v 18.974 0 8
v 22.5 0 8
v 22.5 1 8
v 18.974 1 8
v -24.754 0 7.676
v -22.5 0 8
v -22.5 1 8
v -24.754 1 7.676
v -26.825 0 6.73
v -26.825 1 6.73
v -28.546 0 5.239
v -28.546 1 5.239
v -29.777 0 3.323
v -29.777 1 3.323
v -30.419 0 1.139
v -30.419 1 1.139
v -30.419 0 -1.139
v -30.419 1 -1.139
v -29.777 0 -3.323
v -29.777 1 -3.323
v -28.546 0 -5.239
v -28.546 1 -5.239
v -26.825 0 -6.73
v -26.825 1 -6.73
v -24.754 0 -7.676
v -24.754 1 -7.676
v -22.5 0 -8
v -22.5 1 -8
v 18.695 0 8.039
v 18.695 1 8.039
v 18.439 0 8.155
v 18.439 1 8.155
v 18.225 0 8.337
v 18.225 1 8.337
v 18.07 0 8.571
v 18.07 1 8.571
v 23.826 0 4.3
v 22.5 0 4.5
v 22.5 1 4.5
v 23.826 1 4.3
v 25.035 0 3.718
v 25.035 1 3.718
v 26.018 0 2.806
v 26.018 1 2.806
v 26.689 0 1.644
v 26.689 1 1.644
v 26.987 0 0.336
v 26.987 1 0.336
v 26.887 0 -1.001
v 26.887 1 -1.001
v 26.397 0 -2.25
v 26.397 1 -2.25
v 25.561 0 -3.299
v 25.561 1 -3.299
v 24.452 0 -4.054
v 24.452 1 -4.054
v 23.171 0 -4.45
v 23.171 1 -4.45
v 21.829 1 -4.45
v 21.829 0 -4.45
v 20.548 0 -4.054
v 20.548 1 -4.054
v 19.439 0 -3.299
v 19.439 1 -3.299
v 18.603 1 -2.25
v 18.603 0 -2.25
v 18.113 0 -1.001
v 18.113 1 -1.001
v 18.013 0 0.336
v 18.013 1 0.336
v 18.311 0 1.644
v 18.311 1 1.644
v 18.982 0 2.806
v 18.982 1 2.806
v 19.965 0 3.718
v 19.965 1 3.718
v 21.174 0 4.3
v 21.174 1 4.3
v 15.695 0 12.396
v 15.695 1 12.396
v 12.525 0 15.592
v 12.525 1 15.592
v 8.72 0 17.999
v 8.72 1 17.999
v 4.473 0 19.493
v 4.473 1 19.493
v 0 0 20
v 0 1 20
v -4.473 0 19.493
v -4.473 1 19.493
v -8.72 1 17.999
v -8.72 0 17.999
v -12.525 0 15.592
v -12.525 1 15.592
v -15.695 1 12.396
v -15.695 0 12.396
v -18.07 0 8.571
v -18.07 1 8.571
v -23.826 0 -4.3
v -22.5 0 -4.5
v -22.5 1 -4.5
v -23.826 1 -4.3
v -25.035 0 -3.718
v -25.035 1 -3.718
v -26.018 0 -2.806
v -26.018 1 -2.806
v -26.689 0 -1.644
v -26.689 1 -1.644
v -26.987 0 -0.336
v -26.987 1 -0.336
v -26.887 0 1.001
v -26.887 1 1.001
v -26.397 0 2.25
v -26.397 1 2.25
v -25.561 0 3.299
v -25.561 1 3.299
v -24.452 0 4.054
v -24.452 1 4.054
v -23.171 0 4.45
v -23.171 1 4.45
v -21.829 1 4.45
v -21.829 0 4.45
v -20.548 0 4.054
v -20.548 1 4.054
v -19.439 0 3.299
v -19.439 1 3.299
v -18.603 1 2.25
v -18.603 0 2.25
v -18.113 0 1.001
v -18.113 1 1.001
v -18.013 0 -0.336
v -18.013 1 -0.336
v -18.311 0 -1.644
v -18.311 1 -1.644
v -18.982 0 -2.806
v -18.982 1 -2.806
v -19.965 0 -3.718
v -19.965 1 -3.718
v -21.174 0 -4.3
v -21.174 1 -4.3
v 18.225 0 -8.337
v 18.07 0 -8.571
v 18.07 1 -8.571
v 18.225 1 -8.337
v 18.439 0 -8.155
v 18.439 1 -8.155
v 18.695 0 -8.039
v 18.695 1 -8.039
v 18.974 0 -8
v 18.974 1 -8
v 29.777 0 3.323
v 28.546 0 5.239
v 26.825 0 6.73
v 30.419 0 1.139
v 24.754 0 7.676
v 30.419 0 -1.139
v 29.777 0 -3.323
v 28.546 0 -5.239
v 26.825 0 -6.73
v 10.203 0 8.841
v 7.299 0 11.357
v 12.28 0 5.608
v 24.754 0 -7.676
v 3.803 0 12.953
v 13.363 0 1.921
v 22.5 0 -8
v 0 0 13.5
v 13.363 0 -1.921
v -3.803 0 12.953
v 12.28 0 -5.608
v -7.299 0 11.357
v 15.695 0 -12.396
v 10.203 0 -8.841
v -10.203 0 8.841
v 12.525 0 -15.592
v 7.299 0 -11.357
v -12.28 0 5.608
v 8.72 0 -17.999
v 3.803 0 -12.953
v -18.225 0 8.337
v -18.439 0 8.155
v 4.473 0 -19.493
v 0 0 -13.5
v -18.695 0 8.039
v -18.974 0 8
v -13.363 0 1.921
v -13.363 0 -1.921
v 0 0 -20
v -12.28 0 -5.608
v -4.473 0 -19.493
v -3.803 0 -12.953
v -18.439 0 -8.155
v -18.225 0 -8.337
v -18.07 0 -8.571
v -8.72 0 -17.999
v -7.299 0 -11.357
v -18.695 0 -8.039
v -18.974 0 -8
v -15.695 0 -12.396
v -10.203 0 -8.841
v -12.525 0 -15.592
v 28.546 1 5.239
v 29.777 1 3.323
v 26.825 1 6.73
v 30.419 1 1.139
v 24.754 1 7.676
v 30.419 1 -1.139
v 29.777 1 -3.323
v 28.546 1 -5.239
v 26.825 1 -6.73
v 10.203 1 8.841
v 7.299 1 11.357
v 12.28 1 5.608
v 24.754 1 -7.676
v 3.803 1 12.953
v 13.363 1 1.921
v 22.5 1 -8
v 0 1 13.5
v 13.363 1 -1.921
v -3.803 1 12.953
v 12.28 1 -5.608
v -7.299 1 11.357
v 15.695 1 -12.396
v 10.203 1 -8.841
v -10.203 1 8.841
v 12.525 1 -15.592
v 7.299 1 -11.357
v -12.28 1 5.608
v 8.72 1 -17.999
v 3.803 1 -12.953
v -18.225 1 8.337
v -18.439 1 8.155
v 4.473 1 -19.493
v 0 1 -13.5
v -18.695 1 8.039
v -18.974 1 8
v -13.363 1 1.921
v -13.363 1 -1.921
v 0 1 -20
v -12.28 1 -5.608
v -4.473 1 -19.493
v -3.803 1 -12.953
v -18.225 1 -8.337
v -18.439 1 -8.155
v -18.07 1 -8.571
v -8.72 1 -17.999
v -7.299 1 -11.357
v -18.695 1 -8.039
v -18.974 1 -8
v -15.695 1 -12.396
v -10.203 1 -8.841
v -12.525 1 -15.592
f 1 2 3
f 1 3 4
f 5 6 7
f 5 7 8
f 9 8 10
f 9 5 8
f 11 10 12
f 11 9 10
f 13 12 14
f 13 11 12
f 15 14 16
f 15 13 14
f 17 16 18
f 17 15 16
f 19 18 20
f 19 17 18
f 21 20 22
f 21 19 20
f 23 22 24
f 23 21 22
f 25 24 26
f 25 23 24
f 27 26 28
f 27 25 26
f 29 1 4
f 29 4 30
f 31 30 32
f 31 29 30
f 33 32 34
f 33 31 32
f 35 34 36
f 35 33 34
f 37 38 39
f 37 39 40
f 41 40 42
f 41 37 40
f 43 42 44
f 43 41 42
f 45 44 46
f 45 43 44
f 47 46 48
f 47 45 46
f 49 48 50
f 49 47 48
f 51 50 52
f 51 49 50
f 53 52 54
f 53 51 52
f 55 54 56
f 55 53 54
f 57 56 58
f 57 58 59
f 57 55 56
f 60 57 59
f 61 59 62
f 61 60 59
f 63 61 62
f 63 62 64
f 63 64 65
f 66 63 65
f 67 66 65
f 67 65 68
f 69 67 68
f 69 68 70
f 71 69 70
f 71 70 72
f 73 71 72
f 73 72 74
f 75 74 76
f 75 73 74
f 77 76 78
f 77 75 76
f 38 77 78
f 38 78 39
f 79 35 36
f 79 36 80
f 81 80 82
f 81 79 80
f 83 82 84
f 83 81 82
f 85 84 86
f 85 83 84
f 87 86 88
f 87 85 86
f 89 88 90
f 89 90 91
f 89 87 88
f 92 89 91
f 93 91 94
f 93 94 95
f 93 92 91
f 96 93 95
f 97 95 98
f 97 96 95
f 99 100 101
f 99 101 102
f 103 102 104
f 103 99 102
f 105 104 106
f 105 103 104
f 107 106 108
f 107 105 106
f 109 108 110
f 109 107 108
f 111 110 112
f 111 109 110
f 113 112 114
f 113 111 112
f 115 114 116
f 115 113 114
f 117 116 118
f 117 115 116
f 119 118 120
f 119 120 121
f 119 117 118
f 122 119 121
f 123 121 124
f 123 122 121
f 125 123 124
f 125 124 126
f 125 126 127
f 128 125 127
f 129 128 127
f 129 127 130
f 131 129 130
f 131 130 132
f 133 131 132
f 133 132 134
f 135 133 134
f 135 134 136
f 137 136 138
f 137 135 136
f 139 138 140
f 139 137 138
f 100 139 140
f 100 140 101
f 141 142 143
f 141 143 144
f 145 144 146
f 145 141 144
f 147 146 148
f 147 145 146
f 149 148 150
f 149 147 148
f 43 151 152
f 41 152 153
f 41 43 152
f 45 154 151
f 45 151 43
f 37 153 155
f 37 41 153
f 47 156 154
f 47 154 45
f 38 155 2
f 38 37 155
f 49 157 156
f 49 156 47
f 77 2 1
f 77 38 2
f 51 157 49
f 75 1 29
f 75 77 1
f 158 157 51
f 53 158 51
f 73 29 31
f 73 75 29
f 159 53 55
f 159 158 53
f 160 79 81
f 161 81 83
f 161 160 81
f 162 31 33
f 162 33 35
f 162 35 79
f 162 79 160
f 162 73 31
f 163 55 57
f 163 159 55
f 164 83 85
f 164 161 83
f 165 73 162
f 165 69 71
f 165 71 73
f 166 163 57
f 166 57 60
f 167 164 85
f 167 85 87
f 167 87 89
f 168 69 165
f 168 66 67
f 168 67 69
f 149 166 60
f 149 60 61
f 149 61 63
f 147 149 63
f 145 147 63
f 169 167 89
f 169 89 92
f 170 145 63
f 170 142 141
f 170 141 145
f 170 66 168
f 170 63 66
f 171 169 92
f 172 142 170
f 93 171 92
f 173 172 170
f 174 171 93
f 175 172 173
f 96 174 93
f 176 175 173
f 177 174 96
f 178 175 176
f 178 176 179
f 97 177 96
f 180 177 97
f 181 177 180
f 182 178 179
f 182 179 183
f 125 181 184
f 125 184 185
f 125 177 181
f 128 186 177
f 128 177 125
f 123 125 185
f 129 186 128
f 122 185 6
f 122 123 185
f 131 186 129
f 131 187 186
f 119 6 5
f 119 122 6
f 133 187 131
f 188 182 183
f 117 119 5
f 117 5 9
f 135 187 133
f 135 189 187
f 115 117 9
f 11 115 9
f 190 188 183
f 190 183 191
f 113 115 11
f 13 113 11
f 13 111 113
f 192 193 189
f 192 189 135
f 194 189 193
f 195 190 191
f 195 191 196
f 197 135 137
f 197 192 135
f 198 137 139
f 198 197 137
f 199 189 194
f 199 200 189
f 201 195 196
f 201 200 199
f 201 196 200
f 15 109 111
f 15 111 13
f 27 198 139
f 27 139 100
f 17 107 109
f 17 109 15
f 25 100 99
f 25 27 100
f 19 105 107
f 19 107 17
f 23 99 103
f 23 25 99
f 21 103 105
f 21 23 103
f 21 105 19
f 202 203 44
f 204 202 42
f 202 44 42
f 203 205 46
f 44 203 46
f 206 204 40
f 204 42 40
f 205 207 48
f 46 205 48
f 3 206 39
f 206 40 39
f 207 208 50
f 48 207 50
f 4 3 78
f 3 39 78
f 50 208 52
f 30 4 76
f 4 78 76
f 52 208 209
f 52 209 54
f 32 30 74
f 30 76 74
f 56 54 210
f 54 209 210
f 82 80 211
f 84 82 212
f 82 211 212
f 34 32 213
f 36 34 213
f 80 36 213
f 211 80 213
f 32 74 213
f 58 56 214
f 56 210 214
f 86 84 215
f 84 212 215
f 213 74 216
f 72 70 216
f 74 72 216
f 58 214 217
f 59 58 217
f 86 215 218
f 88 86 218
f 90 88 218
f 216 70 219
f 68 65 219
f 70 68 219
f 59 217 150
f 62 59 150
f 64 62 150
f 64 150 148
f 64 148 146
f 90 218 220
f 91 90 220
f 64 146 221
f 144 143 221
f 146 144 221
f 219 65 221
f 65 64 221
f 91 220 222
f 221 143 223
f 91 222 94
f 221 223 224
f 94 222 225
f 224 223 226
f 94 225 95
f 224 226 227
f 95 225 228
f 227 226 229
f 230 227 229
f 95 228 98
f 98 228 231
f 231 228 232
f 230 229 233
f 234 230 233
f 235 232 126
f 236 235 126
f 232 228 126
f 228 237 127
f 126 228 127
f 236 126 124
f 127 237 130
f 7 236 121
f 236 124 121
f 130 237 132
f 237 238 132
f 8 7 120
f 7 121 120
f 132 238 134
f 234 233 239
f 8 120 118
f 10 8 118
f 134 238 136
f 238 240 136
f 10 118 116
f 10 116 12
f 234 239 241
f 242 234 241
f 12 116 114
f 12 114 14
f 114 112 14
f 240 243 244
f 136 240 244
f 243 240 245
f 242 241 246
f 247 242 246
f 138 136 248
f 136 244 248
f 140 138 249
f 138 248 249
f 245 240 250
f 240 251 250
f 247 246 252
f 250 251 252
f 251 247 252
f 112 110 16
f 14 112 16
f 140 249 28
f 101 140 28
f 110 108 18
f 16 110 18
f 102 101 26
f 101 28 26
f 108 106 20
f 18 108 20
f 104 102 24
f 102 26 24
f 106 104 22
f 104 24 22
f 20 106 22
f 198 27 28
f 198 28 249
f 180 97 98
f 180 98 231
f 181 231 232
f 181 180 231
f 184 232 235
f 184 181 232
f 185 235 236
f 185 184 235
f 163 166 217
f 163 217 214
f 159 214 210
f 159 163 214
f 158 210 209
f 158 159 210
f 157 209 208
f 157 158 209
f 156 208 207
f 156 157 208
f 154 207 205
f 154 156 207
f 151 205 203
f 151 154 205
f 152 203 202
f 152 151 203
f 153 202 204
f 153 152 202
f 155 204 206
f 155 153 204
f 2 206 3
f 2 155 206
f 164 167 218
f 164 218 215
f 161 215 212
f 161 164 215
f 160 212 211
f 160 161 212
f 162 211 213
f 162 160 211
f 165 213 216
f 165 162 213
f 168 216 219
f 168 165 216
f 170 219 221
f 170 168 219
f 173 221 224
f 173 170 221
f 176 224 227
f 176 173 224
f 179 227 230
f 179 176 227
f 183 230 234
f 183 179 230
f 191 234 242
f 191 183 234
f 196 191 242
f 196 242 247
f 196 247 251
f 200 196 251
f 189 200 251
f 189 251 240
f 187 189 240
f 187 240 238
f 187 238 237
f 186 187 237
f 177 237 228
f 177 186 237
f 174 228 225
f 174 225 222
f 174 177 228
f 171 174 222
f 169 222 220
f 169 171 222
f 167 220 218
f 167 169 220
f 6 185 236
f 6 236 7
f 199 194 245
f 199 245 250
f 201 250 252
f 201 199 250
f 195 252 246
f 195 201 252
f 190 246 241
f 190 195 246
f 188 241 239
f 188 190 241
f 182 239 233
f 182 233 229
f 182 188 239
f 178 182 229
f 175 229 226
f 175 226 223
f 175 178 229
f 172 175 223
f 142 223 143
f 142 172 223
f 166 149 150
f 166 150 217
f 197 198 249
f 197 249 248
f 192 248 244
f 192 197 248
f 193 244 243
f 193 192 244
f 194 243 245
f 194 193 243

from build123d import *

# Parameters (mm, degrees)
SKETCH_1_R      = 13.5
SKETCH_1_R_2    = 4.5
EXTRUDE_1_DEPTH = 1


with BuildPart() as part:
    # 草圖1 → 伸長1 (new body)
    with BuildSketch(Plane(origin=(0, 0, 0), x_dir=(1, 0, 0), z_dir=(0, 1, 0))):
        with BuildLine():
            Line((18.973665961, 8), (22.5, 8))
            ThreePointArc((22.5, 8), (30.5, 0), (22.5, -8))
            Line((22.5, -8), (18.973665961, -8))
            ThreePointArc((18.973665961, -8), (18.439143477, -8.154845745), (18.070158058, -8.571428571))
            ThreePointArc((18.070158058, -8.571428571), (0, -20), (-18.070158058, -8.571428571))
            ThreePointArc((-18.070158058, -8.571428571), (-18.439143477, -8.154845745), (-18.973665961, -8))
            Line((-18.973665961, -8), (-22.5, -8))
            ThreePointArc((-22.5, -8), (-30.5, 0), (-22.5, 8))
            Line((-22.5, 8), (-18.973665961, 8))
            ThreePointArc((-18.973665961, 8), (-18.439143477, 8.154845745), (-18.070158058, 8.571428571))
            ThreePointArc((-18.070158058, 8.571428571), (0, 20), (18.070158058, 8.571428571))
            ThreePointArc((18.070158058, 8.571428571), (18.439143477, 8.154845745), (18.973665961, 8))
        make_face()
        with Locations(Location((0, 0, 0), (0, 0, 270))):
            Circle(SKETCH_1_R, mode=Mode.SUBTRACT)
        with Locations(Location((22.5, 0, 0), (0, 0, 270))):
            Circle(SKETCH_1_R_2, mode=Mode.SUBTRACT)
        with Locations(Location((-22.5, 0, 0), (0, 0, 90))):
            Circle(SKETCH_1_R_2, mode=Mode.SUBTRACT)
    extrude(amount=EXTRUDE_1_DEPTH)


solid = part.part
